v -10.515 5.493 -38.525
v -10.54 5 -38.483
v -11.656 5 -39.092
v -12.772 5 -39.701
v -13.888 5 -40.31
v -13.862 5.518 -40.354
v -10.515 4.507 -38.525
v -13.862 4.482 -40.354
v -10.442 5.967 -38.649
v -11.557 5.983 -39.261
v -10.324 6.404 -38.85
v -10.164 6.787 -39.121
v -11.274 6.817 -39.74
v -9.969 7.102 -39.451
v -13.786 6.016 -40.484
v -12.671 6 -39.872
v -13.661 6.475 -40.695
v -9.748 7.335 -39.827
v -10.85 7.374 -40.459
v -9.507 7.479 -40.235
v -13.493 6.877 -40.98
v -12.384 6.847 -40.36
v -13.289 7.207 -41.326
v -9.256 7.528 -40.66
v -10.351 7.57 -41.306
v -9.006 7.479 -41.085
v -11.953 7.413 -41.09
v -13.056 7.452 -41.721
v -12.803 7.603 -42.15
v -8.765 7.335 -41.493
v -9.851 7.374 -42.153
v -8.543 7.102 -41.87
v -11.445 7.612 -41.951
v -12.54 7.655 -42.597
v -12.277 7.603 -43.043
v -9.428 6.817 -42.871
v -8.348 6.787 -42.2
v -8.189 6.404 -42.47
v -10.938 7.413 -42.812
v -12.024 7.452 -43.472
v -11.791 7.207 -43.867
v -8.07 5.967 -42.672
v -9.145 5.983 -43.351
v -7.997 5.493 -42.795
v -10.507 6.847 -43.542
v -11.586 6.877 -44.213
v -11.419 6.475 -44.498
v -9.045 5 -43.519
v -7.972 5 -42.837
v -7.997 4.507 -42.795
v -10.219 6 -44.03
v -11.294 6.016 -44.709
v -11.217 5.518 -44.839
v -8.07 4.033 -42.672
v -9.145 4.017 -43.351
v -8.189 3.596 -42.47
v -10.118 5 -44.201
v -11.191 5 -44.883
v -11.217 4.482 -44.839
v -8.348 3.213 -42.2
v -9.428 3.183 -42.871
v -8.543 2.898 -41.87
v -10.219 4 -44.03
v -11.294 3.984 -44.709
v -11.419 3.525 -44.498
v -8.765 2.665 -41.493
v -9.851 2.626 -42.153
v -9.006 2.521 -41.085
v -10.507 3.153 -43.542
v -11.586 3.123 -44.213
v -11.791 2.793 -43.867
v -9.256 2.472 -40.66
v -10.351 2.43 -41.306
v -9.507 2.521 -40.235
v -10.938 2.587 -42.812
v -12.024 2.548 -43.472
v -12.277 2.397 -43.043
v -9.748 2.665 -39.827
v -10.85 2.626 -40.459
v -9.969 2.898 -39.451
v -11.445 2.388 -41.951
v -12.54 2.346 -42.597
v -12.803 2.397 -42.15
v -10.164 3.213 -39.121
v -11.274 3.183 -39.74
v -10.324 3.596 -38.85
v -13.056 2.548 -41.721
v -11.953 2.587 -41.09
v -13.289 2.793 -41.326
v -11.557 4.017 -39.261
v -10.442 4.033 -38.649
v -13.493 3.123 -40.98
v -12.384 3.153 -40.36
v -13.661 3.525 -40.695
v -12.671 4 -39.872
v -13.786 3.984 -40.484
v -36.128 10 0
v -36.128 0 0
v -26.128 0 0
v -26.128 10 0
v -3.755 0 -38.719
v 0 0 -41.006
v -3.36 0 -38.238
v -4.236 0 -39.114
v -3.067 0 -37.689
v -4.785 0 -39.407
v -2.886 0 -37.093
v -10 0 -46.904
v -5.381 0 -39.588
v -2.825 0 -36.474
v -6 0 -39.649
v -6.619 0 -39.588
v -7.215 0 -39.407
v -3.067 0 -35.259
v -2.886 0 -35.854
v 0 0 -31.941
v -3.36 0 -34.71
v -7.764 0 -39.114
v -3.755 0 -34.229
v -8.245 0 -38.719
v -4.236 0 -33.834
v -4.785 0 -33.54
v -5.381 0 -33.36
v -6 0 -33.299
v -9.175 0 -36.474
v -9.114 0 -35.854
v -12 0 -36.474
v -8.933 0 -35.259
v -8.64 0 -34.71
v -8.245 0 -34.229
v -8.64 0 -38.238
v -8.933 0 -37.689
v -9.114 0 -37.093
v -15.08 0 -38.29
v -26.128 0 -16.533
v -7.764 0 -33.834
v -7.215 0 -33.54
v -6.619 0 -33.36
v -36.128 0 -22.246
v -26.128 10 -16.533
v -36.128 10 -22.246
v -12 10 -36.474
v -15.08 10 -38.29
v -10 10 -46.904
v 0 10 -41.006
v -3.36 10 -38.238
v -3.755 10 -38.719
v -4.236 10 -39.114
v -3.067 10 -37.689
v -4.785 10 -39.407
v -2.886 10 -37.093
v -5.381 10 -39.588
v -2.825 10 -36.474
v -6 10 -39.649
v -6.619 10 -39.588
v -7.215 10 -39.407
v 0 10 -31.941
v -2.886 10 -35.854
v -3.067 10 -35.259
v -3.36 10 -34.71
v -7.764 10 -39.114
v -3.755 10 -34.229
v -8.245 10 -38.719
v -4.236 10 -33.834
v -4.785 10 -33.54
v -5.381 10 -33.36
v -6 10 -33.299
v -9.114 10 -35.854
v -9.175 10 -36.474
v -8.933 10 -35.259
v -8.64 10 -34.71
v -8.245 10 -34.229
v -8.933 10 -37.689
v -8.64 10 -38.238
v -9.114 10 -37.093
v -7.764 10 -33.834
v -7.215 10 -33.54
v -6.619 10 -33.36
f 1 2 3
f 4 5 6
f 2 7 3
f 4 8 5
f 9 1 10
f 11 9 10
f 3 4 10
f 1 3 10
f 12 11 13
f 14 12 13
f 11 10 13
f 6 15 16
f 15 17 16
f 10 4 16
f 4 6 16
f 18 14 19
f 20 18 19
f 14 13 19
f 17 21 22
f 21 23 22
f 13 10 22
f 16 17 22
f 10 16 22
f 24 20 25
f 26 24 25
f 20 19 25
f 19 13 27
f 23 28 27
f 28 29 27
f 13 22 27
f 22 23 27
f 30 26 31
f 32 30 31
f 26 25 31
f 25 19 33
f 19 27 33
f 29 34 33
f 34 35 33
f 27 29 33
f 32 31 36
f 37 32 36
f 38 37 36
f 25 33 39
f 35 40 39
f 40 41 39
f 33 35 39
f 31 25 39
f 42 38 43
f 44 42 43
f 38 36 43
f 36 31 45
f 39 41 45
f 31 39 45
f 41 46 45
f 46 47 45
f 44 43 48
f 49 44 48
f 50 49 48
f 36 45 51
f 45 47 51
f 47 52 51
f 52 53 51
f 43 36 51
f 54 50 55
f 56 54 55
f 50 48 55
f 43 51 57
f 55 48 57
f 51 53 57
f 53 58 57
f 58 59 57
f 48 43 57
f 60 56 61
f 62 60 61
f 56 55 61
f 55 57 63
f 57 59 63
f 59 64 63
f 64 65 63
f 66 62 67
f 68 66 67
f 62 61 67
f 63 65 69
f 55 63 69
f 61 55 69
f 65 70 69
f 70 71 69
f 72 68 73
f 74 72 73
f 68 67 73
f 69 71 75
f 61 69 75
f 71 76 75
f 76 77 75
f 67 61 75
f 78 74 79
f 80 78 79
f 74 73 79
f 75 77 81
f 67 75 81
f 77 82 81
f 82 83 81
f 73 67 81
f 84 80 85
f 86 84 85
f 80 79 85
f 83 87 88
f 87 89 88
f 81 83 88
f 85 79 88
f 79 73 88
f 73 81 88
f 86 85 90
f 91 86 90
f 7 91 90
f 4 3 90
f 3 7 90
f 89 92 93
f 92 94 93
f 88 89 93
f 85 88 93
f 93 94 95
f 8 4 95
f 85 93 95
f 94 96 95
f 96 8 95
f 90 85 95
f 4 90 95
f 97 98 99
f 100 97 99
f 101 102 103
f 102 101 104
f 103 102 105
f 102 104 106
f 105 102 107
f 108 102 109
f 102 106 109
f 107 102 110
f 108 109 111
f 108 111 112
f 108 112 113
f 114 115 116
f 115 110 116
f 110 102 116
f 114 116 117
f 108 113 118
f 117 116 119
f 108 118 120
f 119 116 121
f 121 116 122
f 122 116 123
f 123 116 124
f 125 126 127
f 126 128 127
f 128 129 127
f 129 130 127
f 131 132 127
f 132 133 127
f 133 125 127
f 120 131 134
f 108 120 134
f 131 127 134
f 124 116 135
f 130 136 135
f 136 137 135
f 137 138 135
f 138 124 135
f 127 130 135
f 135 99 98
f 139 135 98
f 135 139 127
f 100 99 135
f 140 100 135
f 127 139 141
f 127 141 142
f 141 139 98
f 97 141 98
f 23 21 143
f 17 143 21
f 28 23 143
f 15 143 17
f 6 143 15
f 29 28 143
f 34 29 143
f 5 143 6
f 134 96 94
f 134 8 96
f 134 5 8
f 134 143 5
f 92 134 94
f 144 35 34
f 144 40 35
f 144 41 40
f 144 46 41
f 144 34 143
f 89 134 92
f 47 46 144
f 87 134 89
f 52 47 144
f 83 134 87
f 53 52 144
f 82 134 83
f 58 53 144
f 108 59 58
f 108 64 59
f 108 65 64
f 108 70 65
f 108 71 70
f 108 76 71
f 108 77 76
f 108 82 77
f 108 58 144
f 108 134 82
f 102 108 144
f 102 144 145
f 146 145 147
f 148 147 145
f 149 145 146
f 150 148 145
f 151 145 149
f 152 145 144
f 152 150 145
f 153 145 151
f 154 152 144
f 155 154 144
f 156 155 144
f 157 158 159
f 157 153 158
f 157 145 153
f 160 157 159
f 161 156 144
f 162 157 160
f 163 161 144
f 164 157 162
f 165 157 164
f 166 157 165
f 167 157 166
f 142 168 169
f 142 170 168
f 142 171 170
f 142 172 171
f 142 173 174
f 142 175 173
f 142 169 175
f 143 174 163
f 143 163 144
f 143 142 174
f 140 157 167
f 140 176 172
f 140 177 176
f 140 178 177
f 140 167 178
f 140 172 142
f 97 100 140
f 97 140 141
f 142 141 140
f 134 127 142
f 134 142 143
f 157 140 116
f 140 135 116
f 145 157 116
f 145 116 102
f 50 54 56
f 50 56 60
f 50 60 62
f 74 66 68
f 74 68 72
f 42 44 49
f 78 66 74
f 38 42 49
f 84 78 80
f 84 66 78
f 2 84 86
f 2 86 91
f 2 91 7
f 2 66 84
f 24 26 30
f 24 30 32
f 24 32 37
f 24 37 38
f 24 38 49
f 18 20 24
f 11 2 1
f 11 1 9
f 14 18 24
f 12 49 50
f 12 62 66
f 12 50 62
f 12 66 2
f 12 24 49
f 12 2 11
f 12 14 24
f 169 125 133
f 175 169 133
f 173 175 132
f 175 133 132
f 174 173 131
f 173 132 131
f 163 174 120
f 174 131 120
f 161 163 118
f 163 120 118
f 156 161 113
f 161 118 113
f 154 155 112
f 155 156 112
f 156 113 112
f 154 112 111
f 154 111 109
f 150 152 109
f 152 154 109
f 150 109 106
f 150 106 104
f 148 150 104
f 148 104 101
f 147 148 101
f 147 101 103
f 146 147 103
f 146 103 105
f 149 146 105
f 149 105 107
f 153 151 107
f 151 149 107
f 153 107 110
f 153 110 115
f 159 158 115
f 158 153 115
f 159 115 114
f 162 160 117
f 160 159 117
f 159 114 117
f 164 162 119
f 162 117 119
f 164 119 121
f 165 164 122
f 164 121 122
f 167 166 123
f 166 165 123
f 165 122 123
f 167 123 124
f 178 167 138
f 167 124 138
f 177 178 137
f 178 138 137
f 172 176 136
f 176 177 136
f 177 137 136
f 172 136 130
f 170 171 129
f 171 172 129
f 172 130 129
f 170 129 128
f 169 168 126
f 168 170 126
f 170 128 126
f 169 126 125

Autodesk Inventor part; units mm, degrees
ref_plane "YZ Plane" through (0, 0, 0) normal (1, 0, 0) x (0, 1, 0)
ref_plane "XZ Plane" through (0, 0, 0) normal (0, 1, 0) x (-1, 0, 0)
ref_plane "XY Plane" through (0, 0, 0) normal (0, 0, 1) x (1, 0, 0)
sketch "Sketch1" plane through (0, 0, 0) normal (0, 1, 0) x (-1, 0, 0)
  line L0 (36.1277, -22.2455) -> (12, -36.4736)
  line L1 (12, -36.4736) -> (15.0796, -38.2896)
  line L2 (15.0796, -38.2896) -> (10, -46.9035)
  line L3 (10, -46.9035) -> (0, -41.0064)
  line L4 (36.1277, -22.2455) -> (36.1277, 0)
  line L5 (36.1277, 0) -> (26.1277, 0)
  line L6 (26.1277, 0) -> (26.1277, -16.5333)
  line L7 (26.1277, -16.5333) -> (0, -31.9408)
  line L8 (0, -31.9408) -> (0, -41.0064)
  line L9 (0, -36.4736) -> (12, -36.4736) construction
  circle A0 centre (6, -36.4736) radius 3.175
  point P0 (0, 0)
  dimension "d1" = 10
  dimension "d8" = 10
  dimension "d9" = 10
  dimension "d10" = 10
  dimension "d12" = 12
  dimension "d13" = 6.35
  dimension "d14" = 22.2455
  dimension "d17" = 61.056
  dimension "d19" = 28.0104
extrude "Extrusion1" add sketch "Sketch1" along normal blind 10
sketch "Sketch2" plane through (-15.0796, 0, -38.2896) normal (-0.8613822, 0, -0.5079575) x (-0.5079575, 0, 0.8613822)
  line L0 (0, 0) -> (-10, 0) projected
  line L1 (0, 0) -> (0, 10) projected
  line L2 (-10, 10) -> (0, 10) projected
  line L3 (-10, 0) -> (-10, 10) projected
  line L4 (-5, 10) -> (-5, 0) construction
  line L5 (-10, 5) -> (-5, 5) construction
  circle A0 centre (-5, 5) radius 2.5275
  circle A1 centre (-5, 5) radius 2.6545
  point P0 (25.3222, 0)
  dimension "d22" = 5.055
  dimension "d23" = 5.309
extrude "Extrusion2" cut sketch "Sketch2" against normal blind 3.81 contours A0
sketch "Sketch3" plane through (-9.2579, 5, -40.6612) normal (-0.8613822, 0, -0.5079575) x (-0.5079575, 0, 0.8613822)
  line L0 (-5, 0) -> (0, 0) construction
  circle A0 centre (0, 0) radius 2.5275 projected
  circle A1 centre (0, 0) radius 2.5275
  point P0 (30.3222, -5)
loft "Loft1" cut profiles "Sketch2" section 2 edges at (-7.9723, 5, -42.8373) contours A0 | A1
properties part number "seeSaw"
